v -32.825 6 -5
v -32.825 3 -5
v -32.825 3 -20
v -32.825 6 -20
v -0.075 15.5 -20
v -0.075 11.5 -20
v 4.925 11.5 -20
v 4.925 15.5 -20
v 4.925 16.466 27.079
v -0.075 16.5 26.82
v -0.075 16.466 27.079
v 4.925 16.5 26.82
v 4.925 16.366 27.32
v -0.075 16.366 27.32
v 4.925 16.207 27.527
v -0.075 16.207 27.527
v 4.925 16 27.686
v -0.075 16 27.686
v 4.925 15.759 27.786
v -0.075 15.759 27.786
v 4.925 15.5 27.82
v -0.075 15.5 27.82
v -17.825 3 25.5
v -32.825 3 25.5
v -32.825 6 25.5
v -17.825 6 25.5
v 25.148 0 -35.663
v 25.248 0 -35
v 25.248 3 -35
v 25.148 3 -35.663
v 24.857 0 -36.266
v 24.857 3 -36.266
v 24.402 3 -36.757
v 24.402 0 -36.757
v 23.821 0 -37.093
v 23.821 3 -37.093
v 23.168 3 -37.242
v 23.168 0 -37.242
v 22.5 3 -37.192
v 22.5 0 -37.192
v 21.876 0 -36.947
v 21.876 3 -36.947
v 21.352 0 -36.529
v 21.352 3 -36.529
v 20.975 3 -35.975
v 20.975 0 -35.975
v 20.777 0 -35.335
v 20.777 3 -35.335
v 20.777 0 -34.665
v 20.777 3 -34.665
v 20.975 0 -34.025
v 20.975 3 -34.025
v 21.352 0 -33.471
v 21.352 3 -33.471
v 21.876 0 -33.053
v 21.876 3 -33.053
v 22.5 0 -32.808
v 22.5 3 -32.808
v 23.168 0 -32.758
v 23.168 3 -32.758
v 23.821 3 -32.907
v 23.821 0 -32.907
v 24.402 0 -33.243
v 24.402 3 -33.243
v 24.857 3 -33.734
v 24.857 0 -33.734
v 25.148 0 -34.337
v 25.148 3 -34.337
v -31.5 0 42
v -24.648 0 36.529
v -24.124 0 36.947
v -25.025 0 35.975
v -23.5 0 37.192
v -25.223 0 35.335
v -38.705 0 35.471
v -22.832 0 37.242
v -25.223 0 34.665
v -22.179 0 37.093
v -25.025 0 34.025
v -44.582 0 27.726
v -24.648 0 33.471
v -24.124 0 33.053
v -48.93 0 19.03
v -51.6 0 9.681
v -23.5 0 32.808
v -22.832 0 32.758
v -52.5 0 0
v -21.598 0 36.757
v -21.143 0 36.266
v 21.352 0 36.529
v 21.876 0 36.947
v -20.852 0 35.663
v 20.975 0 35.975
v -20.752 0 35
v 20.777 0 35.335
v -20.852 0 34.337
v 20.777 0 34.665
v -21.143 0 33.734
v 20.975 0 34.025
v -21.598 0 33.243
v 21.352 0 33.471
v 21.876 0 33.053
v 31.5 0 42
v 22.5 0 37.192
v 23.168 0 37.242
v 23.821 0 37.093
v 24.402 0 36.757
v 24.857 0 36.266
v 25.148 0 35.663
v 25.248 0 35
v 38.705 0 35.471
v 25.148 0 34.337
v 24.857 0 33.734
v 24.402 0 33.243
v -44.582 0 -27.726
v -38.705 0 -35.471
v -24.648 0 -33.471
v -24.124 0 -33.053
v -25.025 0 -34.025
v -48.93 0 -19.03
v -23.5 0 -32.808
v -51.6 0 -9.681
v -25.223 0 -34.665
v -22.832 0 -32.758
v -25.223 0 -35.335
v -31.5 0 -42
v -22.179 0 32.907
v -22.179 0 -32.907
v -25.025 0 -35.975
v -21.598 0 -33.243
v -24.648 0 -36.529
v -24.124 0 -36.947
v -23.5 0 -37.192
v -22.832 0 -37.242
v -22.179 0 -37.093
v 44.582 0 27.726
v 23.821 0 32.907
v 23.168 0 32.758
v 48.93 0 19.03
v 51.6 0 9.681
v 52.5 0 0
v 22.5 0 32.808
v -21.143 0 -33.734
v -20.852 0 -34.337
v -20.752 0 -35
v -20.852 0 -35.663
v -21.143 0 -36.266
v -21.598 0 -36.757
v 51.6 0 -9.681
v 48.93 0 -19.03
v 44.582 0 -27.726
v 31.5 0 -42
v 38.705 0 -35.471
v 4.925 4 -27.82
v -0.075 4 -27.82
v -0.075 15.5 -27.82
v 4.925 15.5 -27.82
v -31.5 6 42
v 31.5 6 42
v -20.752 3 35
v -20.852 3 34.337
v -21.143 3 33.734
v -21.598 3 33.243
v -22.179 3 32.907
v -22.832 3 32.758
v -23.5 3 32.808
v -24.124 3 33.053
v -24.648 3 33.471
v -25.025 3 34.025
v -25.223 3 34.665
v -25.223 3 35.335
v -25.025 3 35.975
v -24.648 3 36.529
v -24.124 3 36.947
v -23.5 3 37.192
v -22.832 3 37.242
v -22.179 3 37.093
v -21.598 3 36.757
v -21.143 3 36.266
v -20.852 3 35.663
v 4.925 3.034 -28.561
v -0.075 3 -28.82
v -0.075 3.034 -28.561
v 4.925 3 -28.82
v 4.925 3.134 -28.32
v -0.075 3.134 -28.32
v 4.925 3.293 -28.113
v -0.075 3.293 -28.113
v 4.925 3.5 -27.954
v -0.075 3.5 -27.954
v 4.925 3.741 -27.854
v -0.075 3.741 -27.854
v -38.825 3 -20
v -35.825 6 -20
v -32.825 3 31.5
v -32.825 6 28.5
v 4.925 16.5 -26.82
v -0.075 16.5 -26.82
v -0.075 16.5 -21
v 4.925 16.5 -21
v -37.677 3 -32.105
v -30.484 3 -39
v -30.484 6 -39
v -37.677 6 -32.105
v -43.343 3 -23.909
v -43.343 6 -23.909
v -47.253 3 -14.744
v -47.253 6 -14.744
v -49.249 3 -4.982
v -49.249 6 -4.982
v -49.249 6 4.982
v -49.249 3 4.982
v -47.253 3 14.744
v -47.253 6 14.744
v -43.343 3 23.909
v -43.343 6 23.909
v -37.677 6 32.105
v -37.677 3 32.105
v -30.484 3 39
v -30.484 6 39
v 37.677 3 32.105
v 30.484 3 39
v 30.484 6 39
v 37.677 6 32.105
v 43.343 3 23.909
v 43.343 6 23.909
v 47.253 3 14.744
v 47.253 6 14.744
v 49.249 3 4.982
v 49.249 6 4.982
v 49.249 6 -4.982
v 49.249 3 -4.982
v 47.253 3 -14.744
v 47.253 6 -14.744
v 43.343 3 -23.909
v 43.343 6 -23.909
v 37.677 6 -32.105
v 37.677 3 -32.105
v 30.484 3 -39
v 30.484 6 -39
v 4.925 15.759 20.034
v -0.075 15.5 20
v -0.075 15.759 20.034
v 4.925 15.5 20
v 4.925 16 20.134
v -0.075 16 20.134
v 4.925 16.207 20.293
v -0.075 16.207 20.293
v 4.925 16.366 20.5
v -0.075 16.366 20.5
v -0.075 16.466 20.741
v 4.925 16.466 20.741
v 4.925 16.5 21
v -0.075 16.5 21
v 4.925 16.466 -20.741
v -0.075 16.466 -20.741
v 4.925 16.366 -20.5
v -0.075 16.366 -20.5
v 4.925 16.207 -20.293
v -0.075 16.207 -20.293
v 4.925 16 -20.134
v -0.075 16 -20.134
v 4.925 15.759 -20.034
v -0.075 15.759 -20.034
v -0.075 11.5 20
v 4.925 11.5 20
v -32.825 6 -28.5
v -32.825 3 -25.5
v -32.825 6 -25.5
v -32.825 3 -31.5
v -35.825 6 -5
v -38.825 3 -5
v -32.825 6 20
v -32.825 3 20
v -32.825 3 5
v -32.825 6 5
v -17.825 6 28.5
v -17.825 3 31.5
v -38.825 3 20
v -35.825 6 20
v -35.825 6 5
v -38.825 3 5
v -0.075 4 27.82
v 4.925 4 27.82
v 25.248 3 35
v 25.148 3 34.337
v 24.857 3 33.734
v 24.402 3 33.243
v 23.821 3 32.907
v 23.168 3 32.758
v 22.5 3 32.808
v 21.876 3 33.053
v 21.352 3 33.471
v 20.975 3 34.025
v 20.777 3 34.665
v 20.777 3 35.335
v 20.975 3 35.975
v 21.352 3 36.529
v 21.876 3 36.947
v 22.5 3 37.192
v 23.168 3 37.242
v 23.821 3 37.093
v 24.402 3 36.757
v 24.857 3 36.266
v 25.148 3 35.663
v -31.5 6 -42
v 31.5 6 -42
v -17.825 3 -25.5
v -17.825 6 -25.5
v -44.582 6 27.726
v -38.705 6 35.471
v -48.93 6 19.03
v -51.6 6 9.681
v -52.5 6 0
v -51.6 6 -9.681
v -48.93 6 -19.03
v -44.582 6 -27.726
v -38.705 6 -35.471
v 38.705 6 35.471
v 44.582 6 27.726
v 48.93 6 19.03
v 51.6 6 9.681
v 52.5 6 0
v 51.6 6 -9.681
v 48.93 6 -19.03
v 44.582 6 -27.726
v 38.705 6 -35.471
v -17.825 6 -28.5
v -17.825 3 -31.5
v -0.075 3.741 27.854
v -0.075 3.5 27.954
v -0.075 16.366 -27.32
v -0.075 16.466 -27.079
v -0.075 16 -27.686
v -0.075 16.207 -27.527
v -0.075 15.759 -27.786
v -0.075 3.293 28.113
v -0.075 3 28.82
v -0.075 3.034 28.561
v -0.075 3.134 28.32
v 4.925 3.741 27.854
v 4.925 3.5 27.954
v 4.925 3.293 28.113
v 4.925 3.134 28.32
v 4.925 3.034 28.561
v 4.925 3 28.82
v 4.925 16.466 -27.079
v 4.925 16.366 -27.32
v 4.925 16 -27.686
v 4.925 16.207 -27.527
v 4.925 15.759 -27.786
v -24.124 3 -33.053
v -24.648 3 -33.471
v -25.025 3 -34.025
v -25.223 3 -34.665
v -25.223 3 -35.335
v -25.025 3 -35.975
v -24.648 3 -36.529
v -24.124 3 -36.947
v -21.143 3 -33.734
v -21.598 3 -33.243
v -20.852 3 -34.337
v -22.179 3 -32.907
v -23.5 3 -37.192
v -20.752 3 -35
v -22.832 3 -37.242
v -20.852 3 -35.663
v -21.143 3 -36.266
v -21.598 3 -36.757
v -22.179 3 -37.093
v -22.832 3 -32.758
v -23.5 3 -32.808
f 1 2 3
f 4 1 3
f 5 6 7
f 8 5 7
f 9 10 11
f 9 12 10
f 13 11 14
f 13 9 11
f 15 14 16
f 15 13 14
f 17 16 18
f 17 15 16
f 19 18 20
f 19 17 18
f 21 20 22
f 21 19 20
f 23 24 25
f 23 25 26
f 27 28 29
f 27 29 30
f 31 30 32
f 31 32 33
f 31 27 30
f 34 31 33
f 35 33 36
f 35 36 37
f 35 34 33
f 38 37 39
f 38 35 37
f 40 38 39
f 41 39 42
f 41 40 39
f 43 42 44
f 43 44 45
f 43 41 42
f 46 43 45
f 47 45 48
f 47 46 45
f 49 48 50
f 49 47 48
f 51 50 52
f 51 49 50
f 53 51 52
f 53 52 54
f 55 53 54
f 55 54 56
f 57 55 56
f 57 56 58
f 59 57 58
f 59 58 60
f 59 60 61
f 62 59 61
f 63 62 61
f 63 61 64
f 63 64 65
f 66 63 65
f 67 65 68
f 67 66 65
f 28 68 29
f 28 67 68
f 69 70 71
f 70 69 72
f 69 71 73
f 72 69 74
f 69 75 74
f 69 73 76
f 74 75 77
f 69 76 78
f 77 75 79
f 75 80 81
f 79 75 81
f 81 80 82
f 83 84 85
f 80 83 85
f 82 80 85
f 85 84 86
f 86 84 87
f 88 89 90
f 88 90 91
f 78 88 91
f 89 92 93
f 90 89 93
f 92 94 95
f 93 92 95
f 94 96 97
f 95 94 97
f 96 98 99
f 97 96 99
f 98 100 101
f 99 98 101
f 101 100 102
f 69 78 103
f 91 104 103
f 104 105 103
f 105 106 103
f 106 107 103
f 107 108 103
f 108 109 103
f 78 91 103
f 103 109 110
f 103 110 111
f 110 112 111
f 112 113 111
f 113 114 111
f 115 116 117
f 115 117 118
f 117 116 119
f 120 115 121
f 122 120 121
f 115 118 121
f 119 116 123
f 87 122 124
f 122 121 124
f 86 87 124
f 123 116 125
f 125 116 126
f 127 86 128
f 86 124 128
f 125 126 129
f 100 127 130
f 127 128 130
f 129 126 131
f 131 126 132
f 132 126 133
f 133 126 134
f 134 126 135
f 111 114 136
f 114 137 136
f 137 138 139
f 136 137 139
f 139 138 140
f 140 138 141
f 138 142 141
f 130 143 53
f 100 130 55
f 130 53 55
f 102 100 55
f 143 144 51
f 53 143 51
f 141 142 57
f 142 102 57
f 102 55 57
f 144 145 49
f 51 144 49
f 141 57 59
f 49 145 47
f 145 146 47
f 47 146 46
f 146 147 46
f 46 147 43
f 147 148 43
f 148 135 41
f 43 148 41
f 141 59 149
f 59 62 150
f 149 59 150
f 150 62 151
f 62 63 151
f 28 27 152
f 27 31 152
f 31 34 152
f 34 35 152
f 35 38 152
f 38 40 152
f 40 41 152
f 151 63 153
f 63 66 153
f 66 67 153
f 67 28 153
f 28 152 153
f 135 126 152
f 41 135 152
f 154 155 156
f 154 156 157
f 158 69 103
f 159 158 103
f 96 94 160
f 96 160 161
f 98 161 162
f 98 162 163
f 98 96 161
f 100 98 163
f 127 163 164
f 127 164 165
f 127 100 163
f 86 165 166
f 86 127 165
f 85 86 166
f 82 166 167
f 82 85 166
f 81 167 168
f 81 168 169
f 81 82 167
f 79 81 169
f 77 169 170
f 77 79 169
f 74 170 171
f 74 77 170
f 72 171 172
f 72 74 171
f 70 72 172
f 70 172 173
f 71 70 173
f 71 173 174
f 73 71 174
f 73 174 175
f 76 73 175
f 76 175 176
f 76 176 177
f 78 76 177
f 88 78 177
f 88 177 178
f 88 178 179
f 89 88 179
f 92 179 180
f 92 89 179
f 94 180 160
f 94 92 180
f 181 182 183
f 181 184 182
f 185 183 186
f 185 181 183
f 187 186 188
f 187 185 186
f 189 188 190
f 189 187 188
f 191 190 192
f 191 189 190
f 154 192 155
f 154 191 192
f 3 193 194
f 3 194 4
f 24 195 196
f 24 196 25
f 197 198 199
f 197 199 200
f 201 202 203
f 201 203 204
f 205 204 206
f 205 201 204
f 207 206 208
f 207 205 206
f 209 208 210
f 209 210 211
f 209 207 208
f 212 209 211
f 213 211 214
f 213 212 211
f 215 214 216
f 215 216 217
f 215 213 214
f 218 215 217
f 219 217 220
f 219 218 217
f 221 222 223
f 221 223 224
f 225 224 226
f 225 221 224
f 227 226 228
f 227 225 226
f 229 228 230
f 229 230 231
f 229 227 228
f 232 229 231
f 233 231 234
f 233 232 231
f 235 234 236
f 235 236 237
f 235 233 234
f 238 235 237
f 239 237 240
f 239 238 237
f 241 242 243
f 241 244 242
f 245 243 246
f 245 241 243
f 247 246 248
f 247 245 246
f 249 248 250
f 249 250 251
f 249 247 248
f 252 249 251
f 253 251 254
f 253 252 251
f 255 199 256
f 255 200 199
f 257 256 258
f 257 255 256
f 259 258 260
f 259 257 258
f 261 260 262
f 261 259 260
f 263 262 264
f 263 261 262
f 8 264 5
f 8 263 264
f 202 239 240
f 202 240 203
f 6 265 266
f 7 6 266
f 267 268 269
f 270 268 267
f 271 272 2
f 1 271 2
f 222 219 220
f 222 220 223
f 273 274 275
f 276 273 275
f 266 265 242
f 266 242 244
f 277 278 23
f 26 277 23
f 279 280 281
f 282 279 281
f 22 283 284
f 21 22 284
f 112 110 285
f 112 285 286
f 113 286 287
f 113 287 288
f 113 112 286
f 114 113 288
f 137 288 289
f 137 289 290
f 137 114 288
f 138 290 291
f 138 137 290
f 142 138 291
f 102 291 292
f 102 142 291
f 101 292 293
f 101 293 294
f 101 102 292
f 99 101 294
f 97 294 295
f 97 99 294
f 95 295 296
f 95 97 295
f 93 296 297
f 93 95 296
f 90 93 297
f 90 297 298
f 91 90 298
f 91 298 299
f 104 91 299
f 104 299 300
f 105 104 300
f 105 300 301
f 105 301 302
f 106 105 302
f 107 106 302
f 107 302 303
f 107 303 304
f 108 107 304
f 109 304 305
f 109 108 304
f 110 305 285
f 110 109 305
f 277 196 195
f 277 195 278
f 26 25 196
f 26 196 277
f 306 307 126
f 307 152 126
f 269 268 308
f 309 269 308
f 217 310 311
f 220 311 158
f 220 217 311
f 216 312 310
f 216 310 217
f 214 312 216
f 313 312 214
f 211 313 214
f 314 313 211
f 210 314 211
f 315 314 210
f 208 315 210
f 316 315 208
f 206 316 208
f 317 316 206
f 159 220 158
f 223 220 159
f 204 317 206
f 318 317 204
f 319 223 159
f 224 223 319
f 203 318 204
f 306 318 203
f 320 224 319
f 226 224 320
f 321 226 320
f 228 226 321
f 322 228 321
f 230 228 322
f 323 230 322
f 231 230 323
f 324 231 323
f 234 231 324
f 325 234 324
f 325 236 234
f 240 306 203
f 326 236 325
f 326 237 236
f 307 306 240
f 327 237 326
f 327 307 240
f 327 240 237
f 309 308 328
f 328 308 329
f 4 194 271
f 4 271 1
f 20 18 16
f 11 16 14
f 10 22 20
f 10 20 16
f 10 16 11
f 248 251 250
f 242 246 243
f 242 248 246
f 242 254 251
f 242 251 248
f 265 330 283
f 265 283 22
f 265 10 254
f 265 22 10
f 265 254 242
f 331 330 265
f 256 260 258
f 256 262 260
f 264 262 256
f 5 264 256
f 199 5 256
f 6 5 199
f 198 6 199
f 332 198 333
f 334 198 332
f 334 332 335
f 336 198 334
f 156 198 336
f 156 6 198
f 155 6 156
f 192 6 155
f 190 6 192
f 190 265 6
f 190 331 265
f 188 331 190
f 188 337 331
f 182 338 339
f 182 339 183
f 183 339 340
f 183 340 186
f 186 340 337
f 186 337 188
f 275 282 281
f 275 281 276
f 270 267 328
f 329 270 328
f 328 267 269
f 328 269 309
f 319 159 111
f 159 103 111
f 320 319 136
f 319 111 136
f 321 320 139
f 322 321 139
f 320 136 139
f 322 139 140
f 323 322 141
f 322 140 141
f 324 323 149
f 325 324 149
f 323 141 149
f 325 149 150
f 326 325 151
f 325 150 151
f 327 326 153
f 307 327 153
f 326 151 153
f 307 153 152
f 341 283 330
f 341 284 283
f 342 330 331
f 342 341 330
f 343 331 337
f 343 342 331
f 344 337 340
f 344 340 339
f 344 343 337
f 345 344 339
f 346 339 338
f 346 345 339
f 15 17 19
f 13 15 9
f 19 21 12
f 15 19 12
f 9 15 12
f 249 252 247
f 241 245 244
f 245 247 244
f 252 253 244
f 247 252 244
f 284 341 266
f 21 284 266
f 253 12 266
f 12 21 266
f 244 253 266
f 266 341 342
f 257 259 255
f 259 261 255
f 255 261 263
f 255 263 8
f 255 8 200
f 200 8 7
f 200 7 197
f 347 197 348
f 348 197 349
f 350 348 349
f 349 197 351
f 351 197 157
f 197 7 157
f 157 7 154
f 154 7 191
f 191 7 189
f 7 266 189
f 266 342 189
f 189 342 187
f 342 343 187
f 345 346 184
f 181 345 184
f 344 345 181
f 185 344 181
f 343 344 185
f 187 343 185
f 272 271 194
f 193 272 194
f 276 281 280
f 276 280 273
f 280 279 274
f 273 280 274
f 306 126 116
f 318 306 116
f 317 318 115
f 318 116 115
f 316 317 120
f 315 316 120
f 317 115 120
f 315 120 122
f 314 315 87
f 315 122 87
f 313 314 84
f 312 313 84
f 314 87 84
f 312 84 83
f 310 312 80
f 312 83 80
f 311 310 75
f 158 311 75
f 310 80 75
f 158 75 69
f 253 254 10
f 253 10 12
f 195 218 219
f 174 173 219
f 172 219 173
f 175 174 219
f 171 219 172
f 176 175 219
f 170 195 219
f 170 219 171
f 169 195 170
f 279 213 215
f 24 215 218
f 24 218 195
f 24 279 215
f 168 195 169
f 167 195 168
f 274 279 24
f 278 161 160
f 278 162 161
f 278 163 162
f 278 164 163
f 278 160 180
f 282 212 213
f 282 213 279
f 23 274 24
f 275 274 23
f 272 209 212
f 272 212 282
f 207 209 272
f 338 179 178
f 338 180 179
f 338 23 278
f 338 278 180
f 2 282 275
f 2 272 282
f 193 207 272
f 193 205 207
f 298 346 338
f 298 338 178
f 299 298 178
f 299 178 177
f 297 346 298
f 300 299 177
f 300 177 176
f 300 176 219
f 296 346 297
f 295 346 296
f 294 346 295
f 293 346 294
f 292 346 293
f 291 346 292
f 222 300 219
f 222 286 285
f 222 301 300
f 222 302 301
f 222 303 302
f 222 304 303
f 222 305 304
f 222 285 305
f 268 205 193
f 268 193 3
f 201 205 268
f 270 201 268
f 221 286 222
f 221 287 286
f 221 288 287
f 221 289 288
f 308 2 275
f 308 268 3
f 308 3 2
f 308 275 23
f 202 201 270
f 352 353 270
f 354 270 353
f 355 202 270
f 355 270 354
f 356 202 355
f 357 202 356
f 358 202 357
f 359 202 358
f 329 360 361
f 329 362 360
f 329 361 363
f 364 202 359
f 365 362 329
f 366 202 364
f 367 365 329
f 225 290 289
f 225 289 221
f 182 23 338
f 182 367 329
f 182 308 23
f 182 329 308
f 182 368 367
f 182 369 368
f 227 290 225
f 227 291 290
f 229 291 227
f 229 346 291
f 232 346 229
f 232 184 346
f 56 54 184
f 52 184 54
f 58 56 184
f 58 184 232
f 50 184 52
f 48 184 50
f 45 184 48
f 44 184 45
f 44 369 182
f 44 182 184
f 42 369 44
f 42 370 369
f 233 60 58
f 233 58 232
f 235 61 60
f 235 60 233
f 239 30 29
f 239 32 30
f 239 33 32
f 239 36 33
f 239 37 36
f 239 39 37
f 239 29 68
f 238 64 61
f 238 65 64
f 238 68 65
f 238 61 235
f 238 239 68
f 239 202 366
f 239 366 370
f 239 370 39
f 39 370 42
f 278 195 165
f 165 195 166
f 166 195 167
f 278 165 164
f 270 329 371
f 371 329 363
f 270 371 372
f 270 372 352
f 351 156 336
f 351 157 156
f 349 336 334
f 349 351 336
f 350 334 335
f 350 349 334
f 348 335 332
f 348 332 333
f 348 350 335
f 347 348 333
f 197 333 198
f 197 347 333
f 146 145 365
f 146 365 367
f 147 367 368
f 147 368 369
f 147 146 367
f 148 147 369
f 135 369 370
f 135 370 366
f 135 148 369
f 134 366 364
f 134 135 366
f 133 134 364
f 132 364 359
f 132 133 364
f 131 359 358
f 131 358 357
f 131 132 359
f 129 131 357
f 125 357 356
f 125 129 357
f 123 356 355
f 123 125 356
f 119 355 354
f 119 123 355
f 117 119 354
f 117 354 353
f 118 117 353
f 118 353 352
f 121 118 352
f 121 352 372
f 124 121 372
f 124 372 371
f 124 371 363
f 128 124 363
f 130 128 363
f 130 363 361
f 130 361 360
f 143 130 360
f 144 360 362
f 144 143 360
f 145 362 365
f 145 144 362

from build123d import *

# Parameters (mm, degrees)
A_BASE_T42_OUTLINE_R        = 2.2479
A_BASE_T42_OUTLINE_R_2      = 1
A_BASE_T42_DEPTH            = 3
OUTER_BRIM_DEPTH            = 3
SKETCH5_W                   = 3
SKETCH5_H                   = 15
SKETCH5_W_2                 = 15
SKETCH5_H_2                 = 3
BASE_SUPPORTS_DEPTH         = 3
BASE_SUPPORTS_CHAMFER_SIZE  = 3
COVER_START                 = -3
SKETCH6_R                   = 1
COVER_DEPTH                 = 3
SKETCH7_W                   = 5
SKETCH7_H                   = 55.64
SERVO_SIDE_SUPPORTS_DEPTH   = 8.5
SKETCH8_W                   = 5
SKETCH8_H                   = 7.82
SERVO_SIDE_EXTENSIONS_DEPTH = 5
SERVO_CONTOURING_R          = 1


# Read off the part's stored shape, not the designer's step: a_base_t42
with BuildPart() as part:
    # a_base_t42 outline → a_base_t42 (new body)
    with BuildSketch(Plane(origin=(0, 0, 0), x_dir=(1, 0, 0), z_dir=(0, 1, 0))):
        with BuildLine():
            ThreePointArc((31.5, -42), (52.5, 0), (31.5, 42))
            Line((31.5, 42), (-31.5, 42))
            ThreePointArc((-31.5, 42), (-52.5, 0), (-31.5, -42))
            Line((-31.5, -42), (31.5, -42))
        make_face()
        with Locations((-23, -35)):
            Circle(A_BASE_T42_OUTLINE_R, mode=Mode.SUBTRACT)
        with Locations((23, -35)):
            Circle(A_BASE_T42_OUTLINE_R, mode=Mode.SUBTRACT)
        with Locations((-40.25, 0)):
            Circle(A_BASE_T42_OUTLINE_R_2, mode=Mode.SUBTRACT)
        with Locations((-23, 35)):
            Circle(A_BASE_T42_OUTLINE_R, mode=Mode.SUBTRACT)
        with Locations((40.25, 0)):
            Circle(A_BASE_T42_OUTLINE_R_2, mode=Mode.SUBTRACT)
        with Locations((23, 35)):
            Circle(A_BASE_T42_OUTLINE_R, mode=Mode.SUBTRACT)
    extrude(amount=A_BASE_T42_DEPTH)

    # Sketch1 → Outer Brim (add)
    with BuildSketch(Plane(origin=(0, 3, 0), x_dir=(1, 0, 0), z_dir=(0, 1, 0))):
        with BuildLine():
            Line((-31.5, -42), (31.5, -42))
            ThreePointArc((31.5, -42), (52.5, 0), (31.5, 42))
            Line((31.5, 42), (-31.5, 42))
            ThreePointArc((-31.5, 42), (-52.5, 0), (-31.5, -42))
        make_face()
        with BuildLine():
            Line((30.483602149, 39), (-30.483602149, 39))
            ThreePointArc((-30.483602149, 39), (-49.5, 0), (-30.483602149, -39))
            Line((-30.483602149, -39), (30.483602149, -39))
            ThreePointArc((30.483602149, -39), (49.5, 0), (30.483602149, 39))
        make_face(mode=Mode.SUBTRACT)
    extrude(amount=OUTER_BRIM_DEPTH)

    # Sketch5 → Base Supports (add)
    with BuildSketch(Plane(origin=(0, 3, 0), x_dir=(1, 0, 0), z_dir=(0, 1, 0))):
        with Locations((-34.325, -12.5)):
            Rectangle(SKETCH5_W, SKETCH5_H)
        with Locations((-34.325, 12.5)):
            Rectangle(SKETCH5_W, SKETCH5_H)
        with Locations((-25.325, -27)):
            Rectangle(SKETCH5_W_2, SKETCH5_H_2)
        with Locations((-25.325, 27)):
            Rectangle(SKETCH5_W_2, SKETCH5_H_2)
    extrude(amount=BASE_SUPPORTS_DEPTH)

    # Base Supports Chamfer
    base_supports_chamfer_edges = [part.edges().sort_by_distance(p)[0] for p in [
        (-25.325, 3, 28.5),
        (-25.325, 3, -28.5),
        (-35.825, 3, 12.5),
        (-35.825, 3, -12.5),
    ]]
    chamfer(base_supports_chamfer_edges, length=BASE_SUPPORTS_CHAMFER_SIZE - 0.0001)  # a hair under: the kernel refuses the full size

    # Sketch6 → Cover (add)
    with BuildSketch(Plane(origin=(0, 3, 0), x_dir=(1, 0, 0), z_dir=(0, 1, 0)).offset(COVER_START)):
        with Locations((-40.25, 0)):
            Circle(SKETCH6_R)
        with Locations((40.25, 0)):
            Circle(SKETCH6_R)
    extrude(amount=COVER_DEPTH)

    # Sketch7 → Servo Side Supports (add)
    with BuildSketch(Plane(origin=(0, 3, 0), x_dir=(1, 0, 0), z_dir=(0, 1, 0))):
        with Locations((2.425, 0)):
            Rectangle(SKETCH7_W, SKETCH7_H)
    extrude(amount=SERVO_SIDE_SUPPORTS_DEPTH)

    # Sketch8 → Servo Side Extensions (add)
    with BuildSketch(Plane(origin=(0, 11.5, 0), x_dir=(1, 0, 0), z_dir=(0, 1, 0))):
        with Locations((2.425, 23.91)):
            Rectangle(SKETCH8_W, SKETCH8_H)
        with Locations((2.425, -23.91)):
            Rectangle(SKETCH8_W, SKETCH8_H)
    extrude(amount=SERVO_SIDE_EXTENSIONS_DEPTH)

    # Servo Contouring
    servo_contouring_edges = [part.edges().sort_by_distance(p)[0] for p in [
        (2.425, 3, -27.82),
        (2.425, 16.5, -27.82),
        (2.425, 3, 27.82),
        (2.425, 16.5, 27.82),
        (2.425, 16.5, 20),
        (2.425, 16.5, -20),
    ]]
    fillet(servo_contouring_edges, radius=SERVO_CONTOURING_R)


solid = part.part
